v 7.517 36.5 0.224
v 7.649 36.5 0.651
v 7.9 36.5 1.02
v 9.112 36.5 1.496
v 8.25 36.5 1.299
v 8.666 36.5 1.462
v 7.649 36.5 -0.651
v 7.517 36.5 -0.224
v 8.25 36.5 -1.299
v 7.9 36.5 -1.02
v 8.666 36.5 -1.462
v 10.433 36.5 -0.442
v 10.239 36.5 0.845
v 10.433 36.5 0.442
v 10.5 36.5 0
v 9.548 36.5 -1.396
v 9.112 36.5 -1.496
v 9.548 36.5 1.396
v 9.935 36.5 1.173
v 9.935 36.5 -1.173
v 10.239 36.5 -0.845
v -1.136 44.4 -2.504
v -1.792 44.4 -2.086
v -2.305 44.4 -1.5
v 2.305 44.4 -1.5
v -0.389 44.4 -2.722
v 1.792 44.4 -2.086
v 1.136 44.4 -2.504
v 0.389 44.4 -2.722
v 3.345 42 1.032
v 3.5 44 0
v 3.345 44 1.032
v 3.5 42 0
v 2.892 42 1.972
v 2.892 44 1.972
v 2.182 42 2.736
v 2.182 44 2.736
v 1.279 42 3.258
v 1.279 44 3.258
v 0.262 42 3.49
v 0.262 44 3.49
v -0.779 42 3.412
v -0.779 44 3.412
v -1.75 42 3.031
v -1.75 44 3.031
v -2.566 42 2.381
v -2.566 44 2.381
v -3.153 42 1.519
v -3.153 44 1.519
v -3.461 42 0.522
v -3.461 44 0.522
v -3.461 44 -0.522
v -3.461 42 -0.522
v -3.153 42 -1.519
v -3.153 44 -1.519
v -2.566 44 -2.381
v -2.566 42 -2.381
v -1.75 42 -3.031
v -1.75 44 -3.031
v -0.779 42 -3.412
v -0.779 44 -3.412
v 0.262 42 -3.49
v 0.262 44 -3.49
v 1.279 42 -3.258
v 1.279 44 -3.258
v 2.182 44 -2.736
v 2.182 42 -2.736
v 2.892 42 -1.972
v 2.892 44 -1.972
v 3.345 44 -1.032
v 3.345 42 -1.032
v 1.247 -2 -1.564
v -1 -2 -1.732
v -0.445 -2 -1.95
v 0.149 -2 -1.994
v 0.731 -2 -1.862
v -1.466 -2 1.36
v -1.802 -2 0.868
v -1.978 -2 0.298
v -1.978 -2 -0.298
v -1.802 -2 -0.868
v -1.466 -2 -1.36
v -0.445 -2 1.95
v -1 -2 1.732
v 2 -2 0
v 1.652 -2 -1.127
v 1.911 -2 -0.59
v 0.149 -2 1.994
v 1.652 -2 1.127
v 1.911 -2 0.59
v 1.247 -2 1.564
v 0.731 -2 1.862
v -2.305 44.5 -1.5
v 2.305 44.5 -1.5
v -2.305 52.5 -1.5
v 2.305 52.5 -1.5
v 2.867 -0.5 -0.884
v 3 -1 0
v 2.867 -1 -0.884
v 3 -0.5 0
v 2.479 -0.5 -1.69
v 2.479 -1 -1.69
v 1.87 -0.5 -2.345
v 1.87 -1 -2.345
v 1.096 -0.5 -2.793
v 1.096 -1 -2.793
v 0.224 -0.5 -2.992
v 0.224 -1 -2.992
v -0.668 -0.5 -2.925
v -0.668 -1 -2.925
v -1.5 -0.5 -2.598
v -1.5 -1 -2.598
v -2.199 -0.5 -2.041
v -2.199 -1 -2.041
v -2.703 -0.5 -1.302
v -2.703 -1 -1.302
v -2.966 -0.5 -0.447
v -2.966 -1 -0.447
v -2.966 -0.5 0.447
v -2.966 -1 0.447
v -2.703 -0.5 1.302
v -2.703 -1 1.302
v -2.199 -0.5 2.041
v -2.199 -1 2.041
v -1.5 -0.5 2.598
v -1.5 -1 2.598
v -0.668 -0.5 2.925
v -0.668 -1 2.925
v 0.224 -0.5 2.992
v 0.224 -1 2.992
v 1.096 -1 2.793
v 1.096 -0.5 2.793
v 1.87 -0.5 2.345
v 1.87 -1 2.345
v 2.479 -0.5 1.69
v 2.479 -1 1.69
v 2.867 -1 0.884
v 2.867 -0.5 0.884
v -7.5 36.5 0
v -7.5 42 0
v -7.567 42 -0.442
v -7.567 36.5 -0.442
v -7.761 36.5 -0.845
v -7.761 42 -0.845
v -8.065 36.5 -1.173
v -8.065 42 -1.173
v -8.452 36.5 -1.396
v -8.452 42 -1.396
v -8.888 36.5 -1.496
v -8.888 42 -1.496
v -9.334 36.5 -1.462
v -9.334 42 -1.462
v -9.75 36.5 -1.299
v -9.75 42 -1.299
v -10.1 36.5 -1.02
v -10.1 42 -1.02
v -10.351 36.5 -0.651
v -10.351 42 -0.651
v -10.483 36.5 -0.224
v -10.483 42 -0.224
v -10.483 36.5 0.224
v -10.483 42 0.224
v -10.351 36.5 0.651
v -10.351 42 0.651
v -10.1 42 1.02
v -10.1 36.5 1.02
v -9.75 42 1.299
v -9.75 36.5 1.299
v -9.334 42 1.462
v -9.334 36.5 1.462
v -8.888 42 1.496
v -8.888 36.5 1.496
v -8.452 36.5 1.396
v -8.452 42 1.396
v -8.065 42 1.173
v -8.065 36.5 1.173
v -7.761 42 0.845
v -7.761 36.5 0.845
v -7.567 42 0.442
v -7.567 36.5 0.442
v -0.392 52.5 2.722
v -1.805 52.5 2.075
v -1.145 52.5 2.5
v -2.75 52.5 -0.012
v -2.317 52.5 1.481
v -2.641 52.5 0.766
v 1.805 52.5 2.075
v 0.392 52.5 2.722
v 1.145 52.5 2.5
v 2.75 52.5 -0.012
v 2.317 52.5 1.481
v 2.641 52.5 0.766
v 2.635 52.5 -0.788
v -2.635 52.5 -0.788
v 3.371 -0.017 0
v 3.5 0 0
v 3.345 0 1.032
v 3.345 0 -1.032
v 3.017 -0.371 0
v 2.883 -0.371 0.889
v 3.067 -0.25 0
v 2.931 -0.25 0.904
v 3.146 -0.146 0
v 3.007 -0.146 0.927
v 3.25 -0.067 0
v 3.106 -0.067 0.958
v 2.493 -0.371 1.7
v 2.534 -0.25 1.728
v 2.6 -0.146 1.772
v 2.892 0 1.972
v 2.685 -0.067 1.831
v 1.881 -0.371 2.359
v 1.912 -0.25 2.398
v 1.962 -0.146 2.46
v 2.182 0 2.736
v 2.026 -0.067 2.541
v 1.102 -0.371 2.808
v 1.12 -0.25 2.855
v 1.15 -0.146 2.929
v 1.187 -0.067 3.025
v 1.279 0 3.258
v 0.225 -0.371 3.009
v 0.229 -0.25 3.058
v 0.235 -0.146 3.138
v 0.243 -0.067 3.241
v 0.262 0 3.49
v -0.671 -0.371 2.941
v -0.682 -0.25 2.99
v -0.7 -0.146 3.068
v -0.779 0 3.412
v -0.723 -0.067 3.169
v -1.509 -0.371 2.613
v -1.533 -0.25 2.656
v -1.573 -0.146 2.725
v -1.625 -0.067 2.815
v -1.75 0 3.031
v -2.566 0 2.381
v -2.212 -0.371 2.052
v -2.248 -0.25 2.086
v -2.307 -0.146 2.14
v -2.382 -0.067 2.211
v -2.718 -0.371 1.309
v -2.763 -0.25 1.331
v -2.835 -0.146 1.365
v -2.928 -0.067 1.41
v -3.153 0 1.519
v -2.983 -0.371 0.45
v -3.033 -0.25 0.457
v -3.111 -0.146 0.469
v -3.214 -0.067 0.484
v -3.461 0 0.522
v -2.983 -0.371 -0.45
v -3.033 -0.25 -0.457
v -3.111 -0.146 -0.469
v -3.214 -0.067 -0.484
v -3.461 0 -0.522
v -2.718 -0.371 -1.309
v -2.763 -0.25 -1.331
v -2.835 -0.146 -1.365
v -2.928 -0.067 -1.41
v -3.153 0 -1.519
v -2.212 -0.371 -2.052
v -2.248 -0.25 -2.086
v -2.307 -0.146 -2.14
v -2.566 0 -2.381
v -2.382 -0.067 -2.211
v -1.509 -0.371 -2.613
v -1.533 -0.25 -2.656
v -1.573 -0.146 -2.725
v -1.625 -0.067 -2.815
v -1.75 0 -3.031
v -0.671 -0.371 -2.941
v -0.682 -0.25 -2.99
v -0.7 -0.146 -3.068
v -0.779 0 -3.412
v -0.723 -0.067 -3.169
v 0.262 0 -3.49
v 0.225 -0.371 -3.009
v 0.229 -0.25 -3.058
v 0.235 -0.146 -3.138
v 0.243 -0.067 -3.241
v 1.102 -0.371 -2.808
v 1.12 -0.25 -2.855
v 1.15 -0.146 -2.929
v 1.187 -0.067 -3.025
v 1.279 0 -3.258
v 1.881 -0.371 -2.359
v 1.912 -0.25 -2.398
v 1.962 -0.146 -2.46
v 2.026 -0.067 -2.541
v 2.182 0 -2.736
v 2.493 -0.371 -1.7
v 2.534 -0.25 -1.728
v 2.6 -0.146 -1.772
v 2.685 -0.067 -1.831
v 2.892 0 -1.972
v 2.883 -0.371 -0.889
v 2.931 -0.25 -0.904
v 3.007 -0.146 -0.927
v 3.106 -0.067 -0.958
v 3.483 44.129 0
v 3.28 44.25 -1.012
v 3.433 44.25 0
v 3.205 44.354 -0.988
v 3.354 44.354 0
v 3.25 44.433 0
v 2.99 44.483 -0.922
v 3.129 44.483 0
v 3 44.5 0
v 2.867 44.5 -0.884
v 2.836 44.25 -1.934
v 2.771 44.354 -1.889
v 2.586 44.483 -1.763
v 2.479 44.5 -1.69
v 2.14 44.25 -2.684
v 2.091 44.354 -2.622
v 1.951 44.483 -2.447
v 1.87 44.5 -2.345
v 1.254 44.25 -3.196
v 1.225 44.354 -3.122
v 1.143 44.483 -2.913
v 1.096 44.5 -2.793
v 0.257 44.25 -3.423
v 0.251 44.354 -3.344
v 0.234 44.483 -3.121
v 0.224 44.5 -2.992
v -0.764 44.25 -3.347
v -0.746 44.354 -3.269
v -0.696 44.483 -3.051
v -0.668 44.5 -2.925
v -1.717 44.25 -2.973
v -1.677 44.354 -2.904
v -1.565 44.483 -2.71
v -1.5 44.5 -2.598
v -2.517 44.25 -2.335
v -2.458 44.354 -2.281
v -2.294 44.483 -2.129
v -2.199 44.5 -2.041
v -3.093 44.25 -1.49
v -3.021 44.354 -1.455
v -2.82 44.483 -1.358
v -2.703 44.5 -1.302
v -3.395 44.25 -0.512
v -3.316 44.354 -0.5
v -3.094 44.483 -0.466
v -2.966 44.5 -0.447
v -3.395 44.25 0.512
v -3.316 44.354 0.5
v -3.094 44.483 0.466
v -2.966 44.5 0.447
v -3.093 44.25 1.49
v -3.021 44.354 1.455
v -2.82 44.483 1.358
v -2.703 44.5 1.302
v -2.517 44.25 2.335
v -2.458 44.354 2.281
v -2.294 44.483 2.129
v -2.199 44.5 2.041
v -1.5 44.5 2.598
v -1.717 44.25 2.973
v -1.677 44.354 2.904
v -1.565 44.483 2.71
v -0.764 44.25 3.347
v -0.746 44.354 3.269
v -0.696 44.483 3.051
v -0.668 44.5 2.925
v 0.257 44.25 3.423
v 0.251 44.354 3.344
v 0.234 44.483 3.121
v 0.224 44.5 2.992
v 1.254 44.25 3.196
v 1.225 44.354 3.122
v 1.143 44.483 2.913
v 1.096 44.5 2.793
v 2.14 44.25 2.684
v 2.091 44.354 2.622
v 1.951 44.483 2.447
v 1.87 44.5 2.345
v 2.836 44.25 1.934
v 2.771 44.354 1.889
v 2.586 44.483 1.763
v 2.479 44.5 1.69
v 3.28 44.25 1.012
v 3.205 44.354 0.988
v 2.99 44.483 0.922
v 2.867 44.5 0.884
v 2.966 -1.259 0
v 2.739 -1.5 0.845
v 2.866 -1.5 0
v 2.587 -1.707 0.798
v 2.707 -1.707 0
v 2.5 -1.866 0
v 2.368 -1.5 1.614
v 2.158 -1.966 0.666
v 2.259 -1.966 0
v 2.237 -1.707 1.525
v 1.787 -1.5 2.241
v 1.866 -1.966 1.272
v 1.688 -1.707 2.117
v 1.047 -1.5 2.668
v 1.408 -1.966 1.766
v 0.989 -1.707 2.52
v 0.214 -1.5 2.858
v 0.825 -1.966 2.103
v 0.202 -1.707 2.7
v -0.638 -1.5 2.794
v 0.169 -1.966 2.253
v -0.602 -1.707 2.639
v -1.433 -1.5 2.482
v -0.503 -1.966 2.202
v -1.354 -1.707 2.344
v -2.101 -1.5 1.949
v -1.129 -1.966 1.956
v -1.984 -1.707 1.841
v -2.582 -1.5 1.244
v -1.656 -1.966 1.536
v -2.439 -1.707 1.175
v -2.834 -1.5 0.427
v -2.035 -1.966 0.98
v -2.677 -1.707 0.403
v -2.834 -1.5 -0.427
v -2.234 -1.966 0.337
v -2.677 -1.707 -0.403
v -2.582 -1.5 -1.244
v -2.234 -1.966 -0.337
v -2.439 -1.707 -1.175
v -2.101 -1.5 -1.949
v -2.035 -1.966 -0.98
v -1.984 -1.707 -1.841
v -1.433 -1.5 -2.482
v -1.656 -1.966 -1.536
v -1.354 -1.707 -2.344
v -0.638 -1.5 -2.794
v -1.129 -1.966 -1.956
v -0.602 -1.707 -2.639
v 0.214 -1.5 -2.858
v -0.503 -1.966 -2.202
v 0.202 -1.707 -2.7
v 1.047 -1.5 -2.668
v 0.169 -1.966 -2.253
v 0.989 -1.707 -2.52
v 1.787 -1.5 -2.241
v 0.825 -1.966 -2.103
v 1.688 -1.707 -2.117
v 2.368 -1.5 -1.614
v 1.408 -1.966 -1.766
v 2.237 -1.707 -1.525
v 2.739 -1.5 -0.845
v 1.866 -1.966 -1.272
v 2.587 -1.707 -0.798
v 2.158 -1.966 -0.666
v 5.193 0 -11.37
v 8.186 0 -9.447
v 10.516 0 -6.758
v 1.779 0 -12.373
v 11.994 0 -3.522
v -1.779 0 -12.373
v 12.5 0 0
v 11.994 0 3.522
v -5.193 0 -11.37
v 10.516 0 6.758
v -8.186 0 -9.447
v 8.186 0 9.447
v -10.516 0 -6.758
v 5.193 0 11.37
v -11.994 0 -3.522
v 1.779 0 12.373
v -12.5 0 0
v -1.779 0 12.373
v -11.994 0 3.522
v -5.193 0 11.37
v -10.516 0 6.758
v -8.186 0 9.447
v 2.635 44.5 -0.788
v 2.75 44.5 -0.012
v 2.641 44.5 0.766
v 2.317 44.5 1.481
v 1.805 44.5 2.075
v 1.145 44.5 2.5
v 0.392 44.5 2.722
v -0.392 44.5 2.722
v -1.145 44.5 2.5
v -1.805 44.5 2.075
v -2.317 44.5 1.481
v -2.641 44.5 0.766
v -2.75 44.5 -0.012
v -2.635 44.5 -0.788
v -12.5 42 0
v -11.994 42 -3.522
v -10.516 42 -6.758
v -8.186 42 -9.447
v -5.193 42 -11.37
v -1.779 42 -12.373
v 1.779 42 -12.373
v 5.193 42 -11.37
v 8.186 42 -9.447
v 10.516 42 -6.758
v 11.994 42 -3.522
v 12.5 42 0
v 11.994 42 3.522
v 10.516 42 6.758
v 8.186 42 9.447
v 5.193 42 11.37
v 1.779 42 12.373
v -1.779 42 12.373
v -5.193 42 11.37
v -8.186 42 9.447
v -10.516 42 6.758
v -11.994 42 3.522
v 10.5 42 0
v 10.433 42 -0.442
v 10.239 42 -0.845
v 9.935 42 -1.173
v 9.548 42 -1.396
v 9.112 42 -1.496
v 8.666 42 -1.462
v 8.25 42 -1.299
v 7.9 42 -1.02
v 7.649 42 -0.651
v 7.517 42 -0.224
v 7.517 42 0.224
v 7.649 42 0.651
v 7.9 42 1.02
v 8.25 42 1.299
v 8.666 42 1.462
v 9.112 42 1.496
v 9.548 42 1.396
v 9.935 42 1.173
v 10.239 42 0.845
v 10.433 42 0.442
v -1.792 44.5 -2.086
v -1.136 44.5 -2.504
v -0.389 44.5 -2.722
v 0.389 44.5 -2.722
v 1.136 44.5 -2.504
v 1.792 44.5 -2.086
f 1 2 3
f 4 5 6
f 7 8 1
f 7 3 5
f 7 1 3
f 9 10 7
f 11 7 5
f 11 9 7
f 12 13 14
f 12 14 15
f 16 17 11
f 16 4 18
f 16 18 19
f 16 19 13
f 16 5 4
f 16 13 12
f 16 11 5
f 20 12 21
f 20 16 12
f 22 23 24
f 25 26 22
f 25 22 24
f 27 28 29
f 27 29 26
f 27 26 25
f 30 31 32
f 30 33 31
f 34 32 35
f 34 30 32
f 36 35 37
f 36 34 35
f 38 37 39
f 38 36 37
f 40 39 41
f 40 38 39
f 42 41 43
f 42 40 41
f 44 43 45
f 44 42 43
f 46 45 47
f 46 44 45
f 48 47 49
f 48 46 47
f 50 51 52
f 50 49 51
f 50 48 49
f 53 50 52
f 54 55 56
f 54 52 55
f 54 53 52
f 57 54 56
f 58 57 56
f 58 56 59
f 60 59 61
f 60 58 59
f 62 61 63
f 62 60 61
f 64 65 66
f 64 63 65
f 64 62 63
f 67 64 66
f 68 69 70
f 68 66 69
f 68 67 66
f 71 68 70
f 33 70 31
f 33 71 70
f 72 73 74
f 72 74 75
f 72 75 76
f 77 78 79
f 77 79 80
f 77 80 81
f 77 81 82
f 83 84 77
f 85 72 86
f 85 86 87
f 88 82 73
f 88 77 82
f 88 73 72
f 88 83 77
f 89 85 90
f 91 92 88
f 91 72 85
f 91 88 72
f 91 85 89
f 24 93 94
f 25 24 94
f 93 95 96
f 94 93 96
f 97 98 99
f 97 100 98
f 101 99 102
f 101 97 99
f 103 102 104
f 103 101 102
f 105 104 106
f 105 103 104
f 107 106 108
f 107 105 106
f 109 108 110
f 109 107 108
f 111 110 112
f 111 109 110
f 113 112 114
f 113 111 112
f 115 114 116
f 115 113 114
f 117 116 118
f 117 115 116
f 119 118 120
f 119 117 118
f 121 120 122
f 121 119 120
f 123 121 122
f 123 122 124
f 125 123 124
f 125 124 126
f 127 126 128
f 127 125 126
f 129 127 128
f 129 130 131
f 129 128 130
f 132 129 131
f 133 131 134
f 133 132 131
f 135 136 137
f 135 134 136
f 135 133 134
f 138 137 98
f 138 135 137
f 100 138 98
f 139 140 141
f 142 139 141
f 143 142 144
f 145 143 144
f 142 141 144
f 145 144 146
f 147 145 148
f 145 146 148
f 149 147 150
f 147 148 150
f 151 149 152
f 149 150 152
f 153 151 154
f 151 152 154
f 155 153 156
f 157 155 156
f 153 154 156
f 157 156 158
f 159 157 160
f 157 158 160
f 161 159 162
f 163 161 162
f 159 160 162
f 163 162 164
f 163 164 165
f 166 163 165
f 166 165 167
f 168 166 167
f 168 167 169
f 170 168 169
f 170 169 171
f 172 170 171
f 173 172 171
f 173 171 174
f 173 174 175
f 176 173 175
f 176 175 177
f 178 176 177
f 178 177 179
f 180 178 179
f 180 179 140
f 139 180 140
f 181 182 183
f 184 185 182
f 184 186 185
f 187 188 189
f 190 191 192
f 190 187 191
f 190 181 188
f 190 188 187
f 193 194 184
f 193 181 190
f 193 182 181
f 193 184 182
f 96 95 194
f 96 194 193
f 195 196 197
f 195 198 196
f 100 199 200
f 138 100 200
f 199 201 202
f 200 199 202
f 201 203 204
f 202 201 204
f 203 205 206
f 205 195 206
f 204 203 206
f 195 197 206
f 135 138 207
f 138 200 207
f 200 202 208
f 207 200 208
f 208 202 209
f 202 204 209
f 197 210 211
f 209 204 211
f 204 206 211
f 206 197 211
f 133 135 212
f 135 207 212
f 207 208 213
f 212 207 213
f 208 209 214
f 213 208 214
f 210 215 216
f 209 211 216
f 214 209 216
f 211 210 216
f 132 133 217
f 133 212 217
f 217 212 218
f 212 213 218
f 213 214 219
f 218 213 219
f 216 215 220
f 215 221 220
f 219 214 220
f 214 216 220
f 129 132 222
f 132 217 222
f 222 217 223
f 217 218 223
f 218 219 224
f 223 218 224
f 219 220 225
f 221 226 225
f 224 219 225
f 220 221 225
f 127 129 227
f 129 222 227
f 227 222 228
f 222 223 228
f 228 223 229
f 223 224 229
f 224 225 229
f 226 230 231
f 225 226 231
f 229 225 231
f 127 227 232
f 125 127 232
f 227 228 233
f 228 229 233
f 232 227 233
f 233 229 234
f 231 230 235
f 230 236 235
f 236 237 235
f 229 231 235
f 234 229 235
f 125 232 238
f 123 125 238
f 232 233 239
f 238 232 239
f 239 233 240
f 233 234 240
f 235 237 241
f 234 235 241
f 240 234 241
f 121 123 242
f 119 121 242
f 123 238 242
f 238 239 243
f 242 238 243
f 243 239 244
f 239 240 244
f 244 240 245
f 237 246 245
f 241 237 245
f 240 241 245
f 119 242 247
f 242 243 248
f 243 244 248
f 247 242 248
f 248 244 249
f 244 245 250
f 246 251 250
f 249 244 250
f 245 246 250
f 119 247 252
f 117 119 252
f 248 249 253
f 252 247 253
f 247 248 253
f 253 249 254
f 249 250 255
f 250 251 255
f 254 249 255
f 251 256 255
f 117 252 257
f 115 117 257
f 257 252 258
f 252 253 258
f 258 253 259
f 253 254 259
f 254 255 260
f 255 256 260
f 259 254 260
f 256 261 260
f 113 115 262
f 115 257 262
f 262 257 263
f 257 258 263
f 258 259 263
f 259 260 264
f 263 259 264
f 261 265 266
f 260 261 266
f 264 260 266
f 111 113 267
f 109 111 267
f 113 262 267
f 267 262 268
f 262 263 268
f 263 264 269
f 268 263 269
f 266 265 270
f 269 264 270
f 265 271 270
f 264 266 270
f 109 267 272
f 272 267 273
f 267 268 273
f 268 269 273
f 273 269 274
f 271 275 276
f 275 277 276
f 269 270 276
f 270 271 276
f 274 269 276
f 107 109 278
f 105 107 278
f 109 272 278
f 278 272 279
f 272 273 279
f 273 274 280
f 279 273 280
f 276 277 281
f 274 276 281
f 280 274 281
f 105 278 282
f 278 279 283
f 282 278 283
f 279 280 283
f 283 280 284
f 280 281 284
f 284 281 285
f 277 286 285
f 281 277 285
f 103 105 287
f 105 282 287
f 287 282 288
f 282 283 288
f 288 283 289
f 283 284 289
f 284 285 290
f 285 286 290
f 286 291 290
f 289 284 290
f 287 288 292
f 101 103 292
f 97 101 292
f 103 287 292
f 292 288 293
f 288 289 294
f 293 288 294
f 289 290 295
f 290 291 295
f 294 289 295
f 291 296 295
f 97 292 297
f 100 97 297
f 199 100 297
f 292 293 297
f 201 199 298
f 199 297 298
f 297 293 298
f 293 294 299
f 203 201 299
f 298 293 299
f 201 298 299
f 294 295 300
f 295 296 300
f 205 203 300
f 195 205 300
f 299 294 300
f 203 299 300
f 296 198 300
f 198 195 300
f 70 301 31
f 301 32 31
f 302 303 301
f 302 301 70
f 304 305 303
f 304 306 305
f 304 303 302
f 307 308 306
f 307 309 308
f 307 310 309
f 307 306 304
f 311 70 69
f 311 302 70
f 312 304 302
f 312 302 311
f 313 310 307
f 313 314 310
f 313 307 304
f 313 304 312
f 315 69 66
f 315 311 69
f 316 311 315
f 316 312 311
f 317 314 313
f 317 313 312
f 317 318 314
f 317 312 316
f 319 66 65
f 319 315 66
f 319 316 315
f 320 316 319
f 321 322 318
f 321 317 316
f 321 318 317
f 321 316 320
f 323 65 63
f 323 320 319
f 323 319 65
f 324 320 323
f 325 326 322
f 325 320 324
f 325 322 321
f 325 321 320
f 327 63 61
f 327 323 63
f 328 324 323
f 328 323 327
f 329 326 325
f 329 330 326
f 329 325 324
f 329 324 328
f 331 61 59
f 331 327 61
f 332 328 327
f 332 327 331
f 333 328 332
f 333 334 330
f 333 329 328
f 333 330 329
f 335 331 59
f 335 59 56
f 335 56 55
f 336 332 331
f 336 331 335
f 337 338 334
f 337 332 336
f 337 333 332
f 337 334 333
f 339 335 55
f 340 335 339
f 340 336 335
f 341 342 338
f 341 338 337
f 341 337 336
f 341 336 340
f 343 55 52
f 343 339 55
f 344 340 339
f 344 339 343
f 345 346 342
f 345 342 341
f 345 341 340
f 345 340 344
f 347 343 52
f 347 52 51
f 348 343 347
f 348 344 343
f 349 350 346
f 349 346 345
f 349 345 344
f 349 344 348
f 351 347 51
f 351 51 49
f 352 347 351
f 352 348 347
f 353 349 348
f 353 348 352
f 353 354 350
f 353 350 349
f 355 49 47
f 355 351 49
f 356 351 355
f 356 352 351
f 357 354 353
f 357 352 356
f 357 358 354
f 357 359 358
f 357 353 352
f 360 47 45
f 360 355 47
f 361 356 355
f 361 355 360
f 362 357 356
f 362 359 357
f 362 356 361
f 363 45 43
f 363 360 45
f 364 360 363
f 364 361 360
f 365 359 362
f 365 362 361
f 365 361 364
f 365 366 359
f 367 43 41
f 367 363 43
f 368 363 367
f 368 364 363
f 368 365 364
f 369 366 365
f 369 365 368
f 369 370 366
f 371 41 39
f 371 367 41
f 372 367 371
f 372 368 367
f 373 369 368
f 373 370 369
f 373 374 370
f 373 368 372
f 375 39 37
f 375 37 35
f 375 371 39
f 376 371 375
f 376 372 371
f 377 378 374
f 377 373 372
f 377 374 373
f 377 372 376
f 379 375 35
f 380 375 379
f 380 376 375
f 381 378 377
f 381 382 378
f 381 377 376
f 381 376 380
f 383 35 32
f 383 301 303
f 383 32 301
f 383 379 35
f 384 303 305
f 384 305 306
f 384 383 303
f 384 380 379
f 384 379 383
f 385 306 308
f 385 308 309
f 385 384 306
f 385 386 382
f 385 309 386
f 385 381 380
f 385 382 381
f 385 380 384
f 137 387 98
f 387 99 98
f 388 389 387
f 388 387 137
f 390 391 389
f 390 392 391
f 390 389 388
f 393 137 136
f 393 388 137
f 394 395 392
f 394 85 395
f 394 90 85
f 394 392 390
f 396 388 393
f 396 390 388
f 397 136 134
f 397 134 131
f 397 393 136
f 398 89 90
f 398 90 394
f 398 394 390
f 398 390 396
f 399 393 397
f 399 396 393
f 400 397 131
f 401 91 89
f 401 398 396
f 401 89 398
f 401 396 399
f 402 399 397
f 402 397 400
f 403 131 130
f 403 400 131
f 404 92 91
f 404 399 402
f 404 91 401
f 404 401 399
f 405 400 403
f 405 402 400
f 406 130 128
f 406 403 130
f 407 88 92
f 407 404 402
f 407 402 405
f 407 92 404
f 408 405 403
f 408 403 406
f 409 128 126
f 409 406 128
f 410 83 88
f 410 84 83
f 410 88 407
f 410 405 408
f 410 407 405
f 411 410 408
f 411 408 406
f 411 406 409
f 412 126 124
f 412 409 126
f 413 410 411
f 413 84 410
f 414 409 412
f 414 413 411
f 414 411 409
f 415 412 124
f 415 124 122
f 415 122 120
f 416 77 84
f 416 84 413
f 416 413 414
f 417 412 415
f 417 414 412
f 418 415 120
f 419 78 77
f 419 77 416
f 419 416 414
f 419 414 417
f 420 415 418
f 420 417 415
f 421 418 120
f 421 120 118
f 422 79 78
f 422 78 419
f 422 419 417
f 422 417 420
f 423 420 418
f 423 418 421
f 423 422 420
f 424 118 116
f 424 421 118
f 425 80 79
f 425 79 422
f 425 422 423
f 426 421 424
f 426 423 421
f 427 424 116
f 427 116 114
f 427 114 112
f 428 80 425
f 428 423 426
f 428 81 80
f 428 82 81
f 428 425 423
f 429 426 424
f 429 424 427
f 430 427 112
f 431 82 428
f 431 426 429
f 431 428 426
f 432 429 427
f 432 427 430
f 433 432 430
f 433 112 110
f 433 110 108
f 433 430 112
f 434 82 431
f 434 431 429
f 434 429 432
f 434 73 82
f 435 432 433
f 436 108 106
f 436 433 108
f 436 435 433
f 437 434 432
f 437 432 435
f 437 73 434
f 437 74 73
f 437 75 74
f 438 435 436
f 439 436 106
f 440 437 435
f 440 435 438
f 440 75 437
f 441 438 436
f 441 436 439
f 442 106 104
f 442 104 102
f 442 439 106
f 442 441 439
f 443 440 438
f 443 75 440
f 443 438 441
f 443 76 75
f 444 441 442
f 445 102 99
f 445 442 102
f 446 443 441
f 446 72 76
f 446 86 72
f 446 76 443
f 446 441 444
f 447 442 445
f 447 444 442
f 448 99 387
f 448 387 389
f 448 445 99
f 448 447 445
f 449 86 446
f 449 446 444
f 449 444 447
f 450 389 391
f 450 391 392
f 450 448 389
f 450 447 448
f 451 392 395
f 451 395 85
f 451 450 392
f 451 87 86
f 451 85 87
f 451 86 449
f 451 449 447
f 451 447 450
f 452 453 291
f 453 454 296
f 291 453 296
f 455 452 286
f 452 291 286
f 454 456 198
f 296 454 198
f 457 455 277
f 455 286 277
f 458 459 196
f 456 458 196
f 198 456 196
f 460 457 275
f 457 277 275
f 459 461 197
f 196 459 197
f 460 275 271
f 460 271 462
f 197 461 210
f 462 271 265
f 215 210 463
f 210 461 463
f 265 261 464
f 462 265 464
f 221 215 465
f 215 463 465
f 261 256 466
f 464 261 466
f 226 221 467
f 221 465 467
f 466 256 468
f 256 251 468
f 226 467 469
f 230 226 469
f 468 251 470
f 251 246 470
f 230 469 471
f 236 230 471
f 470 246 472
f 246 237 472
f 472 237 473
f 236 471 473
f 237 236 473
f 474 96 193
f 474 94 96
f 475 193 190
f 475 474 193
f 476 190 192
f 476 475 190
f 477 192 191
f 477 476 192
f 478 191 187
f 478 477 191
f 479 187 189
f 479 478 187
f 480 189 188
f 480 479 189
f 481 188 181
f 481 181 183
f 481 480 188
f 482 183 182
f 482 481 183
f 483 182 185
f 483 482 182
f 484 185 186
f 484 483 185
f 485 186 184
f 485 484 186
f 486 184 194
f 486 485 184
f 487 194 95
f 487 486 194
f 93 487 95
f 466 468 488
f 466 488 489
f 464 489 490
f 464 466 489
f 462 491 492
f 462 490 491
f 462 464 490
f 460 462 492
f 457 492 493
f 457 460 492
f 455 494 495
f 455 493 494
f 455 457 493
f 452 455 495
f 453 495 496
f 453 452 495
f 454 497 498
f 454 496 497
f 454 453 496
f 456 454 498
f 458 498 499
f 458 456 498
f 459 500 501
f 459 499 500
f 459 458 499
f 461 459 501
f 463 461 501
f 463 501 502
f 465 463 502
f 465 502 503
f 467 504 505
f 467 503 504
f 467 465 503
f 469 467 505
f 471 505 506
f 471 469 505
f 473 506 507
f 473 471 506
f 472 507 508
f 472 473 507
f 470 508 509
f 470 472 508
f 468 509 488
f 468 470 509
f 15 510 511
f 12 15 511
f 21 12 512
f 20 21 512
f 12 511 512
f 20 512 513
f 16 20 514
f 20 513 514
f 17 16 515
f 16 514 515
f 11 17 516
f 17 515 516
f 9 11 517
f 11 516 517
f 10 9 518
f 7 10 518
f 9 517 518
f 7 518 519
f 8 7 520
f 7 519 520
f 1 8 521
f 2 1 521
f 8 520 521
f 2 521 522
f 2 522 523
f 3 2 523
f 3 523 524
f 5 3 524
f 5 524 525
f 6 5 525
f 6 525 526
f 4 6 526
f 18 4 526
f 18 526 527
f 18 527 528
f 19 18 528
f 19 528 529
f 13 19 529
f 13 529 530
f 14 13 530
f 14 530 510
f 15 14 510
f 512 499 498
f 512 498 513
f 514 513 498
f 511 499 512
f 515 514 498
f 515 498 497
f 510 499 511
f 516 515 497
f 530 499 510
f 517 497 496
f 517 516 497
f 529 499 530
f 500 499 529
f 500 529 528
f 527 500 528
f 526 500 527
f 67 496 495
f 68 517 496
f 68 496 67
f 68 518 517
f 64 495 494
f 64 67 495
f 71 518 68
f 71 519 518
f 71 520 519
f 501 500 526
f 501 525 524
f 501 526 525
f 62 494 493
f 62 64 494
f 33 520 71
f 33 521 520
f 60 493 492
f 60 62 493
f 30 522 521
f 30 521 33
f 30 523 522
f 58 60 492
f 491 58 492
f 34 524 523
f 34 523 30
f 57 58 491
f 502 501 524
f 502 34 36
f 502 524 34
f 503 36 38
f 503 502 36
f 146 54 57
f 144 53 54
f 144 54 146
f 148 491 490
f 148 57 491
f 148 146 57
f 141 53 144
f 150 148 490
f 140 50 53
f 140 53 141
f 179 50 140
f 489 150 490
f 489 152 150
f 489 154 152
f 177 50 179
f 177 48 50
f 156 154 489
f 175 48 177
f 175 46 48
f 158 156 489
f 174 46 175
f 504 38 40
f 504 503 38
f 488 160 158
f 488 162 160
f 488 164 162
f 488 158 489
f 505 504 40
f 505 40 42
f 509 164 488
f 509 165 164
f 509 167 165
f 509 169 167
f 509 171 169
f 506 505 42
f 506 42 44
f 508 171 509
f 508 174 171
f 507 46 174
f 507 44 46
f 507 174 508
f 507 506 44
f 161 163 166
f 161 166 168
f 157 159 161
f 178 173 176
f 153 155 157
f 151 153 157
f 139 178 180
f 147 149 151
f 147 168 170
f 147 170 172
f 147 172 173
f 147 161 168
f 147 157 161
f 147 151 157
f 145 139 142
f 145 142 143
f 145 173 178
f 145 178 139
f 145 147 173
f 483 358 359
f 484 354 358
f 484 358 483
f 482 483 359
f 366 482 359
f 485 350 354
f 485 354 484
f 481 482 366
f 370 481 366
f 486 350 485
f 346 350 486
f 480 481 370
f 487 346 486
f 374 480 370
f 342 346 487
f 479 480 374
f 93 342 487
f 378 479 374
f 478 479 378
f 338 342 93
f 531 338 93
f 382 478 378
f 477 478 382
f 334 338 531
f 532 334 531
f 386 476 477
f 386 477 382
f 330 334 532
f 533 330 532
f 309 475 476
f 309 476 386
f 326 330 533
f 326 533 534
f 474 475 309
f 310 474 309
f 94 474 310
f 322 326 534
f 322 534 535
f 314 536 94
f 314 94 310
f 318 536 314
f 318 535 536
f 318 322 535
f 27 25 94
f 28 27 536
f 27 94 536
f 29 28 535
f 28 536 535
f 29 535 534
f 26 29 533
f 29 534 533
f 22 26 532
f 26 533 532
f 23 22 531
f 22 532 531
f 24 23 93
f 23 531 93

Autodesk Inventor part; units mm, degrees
ref_plane "YZ Plane" through (0, 0, 0) normal (1, 0, 0) x (0, 1, 0)
ref_plane "XZ Plane" through (0, 0, 0) normal (0, 1, 0) x (-1, 0, 0)
ref_plane "XY Plane" through (0, 0, 0) normal (0, 0, 1) x (1, 0, 0)
sketch "Esquisse1" plane through (0, 0, 0) normal (0, 1, 0) x (-1, 0, 0)
  circle A0 centre (0, 0) radius 12.5
  dimension "d0" = 25
extrude "Extrusion1" add sketch "Esquisse1" along normal blind 42
sketch "Esquisse2" plane through (0, 42, 0) normal (0, 1, 0) x (1, 0, 0)
  circle A0 centre (0, 0) radius 12.5 projected
  circle A1 centre (0, 0) radius 3.5
  dimension "d3" = 7
extrude "Extrusion2" add sketch "Esquisse2" along normal blind 2.5 contours A1
sketch "Esquisse3" plane through (0, 44.5, 0) normal (0, 1, 0) x (1, 0, 0)
  circle A0 centre (0, 0) radius 3.5 projected
  circle A1 centre (0, 0) radius 2.75
  dimension "d6" = 5.5
extrude "Extrusion3" add sketch "Esquisse3" along normal blind 8 contours A1
sketch "Esquisse4" plane through (0, 52.5, 0) normal (0, 1, 0) x (1, 0, 0)
  circle A0 centre (0, 0) radius 2.75 projected
  line L0 (-2.3049, 1.5) -> (2.3049, 1.5)
  arc A1 (-2.3049, 1.5) -> (2.3049, 1.5) centre (0, 0) ccw
  arc A2 (2.3049, 1.5) -> (-2.3049, 1.5) centre (0, 0) ccw
  dimension "d9" = 1.5
extrude "Extrusion4" cut sketch "Esquisse4" against normal blind 8.1 contours L0 A0 picked at (0.6217, 1.6736)
sketch "Esquisse5" plane through (0, 42, 0) normal (0, 1, 0) x (1, 0, 0)
  circle A0 centre (0, 0) radius 12.5 projected
  circle A1 centre (-9, 0) radius 1.5
  circle A2 centre (9, 0) radius 1.5
  line L0 (0, 0) -> (0, 12.5) construction
  line L1 (0, 0) -> (-12.5, 0) construction
  dimension "d12" = 3
  dimension "d13" = 9
extrude "Extrusion5" cut sketch "Esquisse5" against normal blind 5.5 contours A1 | A2
sketch "Esquisse6" plane through (0, 0, 0) normal (0, -1, 0) x (1, 0, 0)
  circle A0 centre (0, 0) radius 12.5 projected
  circle A1 centre (0, 0) radius 3
  dimension "d16" = 6
extrude "Extrusion6" add sketch "Esquisse6" along normal blind 2 contours A1
fillet "Congé1" radius 1 1 edges at (-3, -2, 0)
fillet "Congé2" radius 0.5 1 edges at (-3, 0, 0)
fillet "Congé3" radius 0.5 1 edges at (-3.5, 44.5, 0)
properties part number "motor"
